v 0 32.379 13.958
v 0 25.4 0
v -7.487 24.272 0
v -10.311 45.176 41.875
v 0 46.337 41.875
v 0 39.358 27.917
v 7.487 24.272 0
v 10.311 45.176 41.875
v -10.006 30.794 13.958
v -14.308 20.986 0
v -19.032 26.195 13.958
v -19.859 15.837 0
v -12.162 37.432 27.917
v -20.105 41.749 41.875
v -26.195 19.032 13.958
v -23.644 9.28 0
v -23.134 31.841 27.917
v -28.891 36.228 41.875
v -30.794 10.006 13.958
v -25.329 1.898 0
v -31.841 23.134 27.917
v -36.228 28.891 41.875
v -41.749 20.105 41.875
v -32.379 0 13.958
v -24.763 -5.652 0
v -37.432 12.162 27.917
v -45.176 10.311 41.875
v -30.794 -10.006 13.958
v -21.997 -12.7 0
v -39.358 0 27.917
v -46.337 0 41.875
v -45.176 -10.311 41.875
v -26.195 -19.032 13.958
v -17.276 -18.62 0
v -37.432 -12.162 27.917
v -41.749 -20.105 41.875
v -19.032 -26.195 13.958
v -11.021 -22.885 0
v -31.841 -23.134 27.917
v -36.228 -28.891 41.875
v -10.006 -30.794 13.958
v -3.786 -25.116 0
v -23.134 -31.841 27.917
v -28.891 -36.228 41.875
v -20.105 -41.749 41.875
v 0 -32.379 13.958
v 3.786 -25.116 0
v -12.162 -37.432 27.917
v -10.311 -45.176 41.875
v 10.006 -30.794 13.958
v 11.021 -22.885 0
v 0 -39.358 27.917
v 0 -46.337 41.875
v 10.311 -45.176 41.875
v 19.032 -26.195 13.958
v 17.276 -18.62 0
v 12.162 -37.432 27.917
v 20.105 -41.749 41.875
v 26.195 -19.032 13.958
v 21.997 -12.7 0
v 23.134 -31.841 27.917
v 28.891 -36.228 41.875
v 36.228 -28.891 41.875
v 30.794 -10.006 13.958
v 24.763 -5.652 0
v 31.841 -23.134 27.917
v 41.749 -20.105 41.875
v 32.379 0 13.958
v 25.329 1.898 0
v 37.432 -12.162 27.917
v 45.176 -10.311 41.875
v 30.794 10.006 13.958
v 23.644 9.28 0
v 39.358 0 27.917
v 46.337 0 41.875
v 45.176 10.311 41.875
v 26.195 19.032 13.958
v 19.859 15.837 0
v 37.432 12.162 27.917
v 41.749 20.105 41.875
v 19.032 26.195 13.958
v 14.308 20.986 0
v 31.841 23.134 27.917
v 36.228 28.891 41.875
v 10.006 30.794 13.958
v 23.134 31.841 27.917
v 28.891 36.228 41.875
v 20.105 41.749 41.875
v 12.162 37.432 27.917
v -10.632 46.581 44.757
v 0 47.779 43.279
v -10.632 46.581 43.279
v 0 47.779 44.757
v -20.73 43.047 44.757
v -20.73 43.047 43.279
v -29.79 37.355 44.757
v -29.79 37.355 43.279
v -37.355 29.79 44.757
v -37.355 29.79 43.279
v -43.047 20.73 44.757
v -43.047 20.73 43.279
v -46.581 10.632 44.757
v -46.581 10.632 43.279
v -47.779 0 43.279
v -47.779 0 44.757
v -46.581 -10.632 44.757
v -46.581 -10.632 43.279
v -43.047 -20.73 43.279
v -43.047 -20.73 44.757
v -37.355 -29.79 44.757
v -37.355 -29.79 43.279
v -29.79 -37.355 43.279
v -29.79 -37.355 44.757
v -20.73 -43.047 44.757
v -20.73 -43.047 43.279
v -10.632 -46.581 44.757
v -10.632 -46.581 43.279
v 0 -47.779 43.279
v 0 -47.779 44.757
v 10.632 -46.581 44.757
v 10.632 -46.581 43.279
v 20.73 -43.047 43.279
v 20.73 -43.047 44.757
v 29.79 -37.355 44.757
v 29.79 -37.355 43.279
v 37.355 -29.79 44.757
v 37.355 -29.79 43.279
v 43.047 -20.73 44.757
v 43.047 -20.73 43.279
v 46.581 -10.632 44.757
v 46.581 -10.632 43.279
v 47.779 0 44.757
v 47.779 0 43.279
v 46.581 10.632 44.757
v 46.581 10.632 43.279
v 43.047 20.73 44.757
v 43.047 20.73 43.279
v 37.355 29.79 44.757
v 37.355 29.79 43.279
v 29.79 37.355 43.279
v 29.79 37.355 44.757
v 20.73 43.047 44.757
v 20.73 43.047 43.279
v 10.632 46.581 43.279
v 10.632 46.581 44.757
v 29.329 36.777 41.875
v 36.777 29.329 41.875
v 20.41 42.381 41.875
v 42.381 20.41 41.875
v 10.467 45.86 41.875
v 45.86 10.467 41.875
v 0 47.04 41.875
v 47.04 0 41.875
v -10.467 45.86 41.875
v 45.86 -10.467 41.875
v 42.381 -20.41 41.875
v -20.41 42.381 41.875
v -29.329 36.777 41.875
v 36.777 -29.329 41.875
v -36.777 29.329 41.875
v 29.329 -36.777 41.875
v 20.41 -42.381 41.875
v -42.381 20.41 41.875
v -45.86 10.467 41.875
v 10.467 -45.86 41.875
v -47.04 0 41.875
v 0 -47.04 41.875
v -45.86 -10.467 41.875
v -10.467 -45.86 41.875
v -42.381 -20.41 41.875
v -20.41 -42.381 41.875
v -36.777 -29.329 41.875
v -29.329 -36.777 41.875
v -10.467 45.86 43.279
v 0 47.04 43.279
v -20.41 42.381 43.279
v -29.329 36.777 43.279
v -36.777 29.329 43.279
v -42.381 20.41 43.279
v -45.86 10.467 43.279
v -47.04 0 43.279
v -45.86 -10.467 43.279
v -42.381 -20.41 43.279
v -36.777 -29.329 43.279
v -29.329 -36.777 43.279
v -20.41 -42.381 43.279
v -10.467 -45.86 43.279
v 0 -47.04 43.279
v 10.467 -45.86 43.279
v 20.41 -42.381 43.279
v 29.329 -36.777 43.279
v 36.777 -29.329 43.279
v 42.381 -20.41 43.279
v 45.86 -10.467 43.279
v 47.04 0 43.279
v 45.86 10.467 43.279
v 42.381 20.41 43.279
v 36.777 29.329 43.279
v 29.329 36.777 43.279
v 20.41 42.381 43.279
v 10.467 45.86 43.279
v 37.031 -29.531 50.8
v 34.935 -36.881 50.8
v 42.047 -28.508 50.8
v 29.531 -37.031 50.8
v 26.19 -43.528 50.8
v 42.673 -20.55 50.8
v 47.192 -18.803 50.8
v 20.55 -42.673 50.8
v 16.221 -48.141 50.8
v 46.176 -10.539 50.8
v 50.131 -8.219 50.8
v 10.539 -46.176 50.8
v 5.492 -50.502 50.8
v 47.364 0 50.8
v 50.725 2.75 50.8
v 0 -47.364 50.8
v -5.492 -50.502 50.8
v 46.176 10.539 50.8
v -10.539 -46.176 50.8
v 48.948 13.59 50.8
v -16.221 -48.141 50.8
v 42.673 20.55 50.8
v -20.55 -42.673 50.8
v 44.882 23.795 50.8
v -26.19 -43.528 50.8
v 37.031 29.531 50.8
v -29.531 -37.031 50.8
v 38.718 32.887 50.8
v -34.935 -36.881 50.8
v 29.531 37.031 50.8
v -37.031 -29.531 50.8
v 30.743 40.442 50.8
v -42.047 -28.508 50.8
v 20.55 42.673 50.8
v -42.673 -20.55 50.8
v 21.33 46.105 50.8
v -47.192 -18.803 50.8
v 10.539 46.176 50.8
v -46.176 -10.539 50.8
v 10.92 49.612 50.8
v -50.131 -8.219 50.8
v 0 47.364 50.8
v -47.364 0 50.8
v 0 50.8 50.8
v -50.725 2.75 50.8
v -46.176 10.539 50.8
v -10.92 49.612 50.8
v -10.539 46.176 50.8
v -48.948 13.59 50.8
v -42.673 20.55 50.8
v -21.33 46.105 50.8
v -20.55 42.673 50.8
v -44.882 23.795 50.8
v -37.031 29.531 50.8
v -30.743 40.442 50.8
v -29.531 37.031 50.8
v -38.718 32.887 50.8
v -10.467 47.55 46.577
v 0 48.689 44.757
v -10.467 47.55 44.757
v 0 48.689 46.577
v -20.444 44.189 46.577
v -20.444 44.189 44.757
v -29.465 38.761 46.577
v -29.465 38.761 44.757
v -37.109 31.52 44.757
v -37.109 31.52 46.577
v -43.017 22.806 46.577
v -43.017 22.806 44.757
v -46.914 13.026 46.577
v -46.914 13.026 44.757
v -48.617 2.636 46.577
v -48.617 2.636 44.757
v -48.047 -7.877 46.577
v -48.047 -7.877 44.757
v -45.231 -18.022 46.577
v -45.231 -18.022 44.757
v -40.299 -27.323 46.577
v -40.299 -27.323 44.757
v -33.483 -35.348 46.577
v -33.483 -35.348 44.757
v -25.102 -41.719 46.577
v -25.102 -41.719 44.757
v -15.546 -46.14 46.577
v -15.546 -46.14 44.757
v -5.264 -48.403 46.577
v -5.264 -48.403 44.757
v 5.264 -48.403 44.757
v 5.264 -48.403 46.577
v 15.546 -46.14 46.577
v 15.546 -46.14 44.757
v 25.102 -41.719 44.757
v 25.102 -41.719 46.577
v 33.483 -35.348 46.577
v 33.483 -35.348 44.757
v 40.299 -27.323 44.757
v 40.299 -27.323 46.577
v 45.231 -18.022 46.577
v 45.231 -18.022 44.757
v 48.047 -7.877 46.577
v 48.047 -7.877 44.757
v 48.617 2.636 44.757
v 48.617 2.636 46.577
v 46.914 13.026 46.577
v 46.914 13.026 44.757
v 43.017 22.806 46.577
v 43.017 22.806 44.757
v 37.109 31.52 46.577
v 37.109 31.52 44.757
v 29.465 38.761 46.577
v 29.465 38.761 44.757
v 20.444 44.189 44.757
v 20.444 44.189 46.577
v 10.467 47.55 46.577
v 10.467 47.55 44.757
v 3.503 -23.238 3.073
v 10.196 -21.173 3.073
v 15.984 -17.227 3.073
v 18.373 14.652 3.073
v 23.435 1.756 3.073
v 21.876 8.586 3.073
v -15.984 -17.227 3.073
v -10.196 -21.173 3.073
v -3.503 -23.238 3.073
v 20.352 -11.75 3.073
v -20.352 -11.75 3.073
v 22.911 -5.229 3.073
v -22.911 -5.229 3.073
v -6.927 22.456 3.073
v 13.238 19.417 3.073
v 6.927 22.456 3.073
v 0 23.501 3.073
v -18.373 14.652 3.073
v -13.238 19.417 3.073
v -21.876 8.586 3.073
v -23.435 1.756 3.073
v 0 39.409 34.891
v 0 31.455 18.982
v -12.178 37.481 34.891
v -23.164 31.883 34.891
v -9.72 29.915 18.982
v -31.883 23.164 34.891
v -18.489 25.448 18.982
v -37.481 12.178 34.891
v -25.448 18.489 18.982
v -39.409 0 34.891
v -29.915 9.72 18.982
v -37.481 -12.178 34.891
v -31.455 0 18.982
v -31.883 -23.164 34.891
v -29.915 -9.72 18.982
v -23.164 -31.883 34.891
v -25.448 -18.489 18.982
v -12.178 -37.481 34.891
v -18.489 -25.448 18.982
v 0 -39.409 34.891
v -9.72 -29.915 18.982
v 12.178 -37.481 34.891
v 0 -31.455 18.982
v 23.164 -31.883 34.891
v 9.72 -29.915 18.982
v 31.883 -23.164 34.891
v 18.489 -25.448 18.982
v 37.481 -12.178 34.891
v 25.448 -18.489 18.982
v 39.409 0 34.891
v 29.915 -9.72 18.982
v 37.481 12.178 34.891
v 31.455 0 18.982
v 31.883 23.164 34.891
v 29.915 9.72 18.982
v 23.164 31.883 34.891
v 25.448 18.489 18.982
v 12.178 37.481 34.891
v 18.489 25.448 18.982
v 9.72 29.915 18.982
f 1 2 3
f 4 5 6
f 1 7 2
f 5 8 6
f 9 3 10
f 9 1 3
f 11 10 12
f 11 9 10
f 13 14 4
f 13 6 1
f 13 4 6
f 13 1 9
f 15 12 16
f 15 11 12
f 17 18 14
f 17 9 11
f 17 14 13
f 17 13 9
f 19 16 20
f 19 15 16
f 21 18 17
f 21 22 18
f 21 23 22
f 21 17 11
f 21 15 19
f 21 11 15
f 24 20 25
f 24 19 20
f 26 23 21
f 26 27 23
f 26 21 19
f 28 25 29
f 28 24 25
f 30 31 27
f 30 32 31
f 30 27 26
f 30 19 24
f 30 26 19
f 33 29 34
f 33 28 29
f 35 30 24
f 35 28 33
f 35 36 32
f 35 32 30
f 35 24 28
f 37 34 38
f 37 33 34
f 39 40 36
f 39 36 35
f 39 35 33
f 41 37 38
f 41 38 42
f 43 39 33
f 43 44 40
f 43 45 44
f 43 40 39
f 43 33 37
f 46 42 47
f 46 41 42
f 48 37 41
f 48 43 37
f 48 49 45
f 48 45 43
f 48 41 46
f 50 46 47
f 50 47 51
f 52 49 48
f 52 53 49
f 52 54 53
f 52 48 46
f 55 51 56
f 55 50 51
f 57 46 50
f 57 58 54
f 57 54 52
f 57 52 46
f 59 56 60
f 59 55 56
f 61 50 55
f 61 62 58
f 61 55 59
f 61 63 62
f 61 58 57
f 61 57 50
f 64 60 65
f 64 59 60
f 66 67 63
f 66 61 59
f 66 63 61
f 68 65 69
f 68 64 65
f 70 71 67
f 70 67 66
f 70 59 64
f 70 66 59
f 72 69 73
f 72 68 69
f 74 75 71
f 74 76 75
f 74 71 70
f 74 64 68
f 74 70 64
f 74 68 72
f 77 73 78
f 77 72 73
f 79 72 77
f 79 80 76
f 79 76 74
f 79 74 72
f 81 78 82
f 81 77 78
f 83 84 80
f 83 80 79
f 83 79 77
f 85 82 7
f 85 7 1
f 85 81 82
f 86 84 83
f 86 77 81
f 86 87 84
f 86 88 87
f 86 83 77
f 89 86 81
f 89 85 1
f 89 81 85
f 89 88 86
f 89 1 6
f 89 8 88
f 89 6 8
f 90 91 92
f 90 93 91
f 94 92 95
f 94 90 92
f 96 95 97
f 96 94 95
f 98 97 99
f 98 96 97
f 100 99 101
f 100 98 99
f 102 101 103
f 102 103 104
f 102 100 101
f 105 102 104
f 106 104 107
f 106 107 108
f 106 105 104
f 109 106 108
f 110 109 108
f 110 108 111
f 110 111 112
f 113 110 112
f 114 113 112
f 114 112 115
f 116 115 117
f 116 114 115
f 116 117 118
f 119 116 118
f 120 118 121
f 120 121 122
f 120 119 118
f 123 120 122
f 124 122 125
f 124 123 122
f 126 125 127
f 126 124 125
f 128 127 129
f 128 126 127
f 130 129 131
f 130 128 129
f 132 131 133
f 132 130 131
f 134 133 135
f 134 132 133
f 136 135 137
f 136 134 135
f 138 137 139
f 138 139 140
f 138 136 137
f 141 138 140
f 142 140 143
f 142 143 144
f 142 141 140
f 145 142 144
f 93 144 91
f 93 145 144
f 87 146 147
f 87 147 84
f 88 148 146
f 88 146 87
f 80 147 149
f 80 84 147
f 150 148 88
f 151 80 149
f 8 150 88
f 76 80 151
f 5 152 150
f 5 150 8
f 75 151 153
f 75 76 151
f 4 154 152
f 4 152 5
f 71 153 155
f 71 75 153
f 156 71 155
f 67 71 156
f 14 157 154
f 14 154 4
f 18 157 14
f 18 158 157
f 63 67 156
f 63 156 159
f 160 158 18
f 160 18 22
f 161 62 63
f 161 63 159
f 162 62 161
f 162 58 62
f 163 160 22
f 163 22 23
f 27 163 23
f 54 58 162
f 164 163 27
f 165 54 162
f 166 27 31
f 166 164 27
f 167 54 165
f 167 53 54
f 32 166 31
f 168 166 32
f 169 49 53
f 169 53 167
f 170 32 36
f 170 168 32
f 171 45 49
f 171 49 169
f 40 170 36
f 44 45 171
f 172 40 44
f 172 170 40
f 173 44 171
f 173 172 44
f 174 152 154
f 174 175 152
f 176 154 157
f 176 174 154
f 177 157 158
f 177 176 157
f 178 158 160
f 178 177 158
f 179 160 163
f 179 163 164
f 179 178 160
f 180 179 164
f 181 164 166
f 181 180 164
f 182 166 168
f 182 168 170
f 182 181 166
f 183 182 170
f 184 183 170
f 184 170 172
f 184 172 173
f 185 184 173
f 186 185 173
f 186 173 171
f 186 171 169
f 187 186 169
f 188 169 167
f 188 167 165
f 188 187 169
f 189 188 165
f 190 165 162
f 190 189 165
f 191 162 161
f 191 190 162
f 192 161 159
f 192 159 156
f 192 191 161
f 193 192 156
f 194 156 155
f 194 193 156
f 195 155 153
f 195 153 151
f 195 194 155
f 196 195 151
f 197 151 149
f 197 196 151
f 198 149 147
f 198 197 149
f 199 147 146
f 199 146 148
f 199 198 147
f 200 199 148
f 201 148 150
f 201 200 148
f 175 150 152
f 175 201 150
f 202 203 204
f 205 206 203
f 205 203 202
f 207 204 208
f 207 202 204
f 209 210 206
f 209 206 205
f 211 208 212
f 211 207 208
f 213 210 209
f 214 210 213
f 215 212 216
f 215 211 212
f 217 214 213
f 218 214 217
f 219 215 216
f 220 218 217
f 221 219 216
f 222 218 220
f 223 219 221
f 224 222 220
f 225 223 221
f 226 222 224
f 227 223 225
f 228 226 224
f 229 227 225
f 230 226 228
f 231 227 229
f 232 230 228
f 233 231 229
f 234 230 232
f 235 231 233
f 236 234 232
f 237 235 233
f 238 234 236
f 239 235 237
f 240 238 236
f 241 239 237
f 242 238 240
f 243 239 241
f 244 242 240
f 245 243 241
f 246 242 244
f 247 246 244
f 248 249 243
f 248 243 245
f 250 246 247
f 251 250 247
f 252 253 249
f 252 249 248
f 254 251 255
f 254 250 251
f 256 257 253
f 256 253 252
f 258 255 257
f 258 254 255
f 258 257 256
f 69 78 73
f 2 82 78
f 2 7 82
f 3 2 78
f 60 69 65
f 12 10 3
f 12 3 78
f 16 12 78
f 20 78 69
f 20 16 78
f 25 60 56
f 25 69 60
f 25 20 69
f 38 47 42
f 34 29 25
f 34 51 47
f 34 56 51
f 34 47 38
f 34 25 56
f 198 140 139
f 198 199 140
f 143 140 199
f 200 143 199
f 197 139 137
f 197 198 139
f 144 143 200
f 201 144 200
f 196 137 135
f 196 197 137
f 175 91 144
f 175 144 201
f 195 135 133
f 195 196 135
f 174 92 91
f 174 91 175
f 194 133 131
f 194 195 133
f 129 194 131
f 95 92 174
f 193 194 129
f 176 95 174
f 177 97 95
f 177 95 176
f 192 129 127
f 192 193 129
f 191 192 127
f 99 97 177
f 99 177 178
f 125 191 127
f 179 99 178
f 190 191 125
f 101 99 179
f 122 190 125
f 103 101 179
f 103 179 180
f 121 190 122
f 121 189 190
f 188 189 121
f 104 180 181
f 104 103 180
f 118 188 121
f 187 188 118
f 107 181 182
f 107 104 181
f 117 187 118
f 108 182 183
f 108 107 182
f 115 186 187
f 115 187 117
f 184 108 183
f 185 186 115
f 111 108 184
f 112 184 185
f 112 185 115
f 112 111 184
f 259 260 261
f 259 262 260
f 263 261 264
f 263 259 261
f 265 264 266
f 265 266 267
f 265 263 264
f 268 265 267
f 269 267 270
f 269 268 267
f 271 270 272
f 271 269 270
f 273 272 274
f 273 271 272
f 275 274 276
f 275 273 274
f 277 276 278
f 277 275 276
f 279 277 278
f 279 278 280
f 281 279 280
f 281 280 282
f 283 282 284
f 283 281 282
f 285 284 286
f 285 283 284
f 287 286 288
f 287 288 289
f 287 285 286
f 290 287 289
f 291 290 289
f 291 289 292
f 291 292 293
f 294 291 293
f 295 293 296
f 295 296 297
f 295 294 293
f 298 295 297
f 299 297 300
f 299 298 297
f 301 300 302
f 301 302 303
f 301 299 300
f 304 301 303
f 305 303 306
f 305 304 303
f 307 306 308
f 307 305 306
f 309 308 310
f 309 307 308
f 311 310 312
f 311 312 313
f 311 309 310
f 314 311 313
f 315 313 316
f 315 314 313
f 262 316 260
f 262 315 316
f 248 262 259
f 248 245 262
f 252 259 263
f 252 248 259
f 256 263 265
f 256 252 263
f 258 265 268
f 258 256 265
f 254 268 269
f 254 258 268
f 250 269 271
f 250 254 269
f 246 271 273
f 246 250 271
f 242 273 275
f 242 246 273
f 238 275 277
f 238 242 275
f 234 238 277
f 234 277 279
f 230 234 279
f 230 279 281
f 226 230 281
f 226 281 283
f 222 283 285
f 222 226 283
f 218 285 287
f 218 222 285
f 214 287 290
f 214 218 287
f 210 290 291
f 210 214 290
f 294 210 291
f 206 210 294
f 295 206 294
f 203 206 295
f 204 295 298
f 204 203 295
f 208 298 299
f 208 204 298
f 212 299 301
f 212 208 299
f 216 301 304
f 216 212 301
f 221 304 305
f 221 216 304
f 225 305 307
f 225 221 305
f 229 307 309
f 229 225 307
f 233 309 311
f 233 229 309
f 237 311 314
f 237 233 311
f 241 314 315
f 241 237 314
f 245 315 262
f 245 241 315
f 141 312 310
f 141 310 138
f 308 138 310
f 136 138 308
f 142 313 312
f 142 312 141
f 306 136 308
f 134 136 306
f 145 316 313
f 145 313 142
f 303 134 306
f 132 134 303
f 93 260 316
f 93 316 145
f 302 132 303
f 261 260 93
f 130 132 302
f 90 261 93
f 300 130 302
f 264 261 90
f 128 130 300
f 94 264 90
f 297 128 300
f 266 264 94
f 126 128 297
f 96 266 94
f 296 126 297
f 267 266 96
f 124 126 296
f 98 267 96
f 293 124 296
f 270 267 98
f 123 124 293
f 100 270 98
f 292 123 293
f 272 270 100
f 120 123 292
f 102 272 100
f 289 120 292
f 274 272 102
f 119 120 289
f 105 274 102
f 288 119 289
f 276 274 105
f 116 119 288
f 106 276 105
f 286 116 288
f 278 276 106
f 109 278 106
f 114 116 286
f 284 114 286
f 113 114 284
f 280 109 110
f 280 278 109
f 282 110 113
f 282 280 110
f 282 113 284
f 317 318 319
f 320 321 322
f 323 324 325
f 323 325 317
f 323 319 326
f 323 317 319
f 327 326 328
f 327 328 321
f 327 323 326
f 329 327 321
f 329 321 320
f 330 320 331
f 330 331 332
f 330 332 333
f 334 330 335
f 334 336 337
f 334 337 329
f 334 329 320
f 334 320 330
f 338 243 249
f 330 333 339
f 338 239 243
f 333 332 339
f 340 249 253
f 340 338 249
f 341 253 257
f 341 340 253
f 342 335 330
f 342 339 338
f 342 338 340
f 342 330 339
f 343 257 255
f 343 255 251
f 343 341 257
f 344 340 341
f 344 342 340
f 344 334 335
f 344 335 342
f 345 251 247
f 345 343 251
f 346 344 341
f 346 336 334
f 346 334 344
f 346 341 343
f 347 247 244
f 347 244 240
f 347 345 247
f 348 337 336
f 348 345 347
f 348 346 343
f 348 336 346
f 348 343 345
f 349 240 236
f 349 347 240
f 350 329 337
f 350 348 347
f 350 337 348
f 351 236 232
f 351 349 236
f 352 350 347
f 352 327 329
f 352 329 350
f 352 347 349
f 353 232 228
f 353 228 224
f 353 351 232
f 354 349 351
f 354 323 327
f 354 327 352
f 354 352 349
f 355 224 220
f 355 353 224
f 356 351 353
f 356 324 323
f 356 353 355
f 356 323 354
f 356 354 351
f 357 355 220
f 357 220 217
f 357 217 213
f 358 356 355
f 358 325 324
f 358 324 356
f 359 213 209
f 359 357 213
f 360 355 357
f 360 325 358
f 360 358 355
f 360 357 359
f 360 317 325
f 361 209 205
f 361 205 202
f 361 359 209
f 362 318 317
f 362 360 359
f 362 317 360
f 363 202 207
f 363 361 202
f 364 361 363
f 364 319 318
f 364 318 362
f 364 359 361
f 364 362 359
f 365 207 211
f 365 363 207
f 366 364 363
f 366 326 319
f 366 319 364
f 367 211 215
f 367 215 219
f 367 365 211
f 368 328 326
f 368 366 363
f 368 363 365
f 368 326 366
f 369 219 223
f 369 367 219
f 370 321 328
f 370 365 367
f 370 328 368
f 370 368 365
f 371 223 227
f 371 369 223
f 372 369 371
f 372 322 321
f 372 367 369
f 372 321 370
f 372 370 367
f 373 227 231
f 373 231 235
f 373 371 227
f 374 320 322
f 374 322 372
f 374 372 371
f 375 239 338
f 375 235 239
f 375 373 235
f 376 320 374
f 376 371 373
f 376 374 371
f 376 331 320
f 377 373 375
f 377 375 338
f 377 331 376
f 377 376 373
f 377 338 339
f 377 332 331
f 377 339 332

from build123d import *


with BuildPart() as f1:
    # F0 (on Right) → F1 (revolve)
    with BuildSketch(Plane.YZ):
        Polygon((0, 3.0734), (0, 0), (25.4, 0), (46.337384, 41.874768), (47.039628, 43.279255), (47.778658, 44.757316), (48.688656, 46.577311), (50.8, 50.8), (47.363834, 50.8), (23.500534, 3.0734), align=None)
        Polygon((47.039628, 43.279255), (46.337384, 41.874768), (47.039628, 41.874768), align=None)
        Polygon((47.778658, 44.757316), (47.039628, 43.279255), (47.778658, 43.279255), align=None)
        Polygon((48.688656, 46.577311), (47.778658, 44.757316), (48.688656, 44.757316), align=None)
    revolve(axis=Axis((0, 0, 25.4), (0, 0, 1)))


solid = f1.part
